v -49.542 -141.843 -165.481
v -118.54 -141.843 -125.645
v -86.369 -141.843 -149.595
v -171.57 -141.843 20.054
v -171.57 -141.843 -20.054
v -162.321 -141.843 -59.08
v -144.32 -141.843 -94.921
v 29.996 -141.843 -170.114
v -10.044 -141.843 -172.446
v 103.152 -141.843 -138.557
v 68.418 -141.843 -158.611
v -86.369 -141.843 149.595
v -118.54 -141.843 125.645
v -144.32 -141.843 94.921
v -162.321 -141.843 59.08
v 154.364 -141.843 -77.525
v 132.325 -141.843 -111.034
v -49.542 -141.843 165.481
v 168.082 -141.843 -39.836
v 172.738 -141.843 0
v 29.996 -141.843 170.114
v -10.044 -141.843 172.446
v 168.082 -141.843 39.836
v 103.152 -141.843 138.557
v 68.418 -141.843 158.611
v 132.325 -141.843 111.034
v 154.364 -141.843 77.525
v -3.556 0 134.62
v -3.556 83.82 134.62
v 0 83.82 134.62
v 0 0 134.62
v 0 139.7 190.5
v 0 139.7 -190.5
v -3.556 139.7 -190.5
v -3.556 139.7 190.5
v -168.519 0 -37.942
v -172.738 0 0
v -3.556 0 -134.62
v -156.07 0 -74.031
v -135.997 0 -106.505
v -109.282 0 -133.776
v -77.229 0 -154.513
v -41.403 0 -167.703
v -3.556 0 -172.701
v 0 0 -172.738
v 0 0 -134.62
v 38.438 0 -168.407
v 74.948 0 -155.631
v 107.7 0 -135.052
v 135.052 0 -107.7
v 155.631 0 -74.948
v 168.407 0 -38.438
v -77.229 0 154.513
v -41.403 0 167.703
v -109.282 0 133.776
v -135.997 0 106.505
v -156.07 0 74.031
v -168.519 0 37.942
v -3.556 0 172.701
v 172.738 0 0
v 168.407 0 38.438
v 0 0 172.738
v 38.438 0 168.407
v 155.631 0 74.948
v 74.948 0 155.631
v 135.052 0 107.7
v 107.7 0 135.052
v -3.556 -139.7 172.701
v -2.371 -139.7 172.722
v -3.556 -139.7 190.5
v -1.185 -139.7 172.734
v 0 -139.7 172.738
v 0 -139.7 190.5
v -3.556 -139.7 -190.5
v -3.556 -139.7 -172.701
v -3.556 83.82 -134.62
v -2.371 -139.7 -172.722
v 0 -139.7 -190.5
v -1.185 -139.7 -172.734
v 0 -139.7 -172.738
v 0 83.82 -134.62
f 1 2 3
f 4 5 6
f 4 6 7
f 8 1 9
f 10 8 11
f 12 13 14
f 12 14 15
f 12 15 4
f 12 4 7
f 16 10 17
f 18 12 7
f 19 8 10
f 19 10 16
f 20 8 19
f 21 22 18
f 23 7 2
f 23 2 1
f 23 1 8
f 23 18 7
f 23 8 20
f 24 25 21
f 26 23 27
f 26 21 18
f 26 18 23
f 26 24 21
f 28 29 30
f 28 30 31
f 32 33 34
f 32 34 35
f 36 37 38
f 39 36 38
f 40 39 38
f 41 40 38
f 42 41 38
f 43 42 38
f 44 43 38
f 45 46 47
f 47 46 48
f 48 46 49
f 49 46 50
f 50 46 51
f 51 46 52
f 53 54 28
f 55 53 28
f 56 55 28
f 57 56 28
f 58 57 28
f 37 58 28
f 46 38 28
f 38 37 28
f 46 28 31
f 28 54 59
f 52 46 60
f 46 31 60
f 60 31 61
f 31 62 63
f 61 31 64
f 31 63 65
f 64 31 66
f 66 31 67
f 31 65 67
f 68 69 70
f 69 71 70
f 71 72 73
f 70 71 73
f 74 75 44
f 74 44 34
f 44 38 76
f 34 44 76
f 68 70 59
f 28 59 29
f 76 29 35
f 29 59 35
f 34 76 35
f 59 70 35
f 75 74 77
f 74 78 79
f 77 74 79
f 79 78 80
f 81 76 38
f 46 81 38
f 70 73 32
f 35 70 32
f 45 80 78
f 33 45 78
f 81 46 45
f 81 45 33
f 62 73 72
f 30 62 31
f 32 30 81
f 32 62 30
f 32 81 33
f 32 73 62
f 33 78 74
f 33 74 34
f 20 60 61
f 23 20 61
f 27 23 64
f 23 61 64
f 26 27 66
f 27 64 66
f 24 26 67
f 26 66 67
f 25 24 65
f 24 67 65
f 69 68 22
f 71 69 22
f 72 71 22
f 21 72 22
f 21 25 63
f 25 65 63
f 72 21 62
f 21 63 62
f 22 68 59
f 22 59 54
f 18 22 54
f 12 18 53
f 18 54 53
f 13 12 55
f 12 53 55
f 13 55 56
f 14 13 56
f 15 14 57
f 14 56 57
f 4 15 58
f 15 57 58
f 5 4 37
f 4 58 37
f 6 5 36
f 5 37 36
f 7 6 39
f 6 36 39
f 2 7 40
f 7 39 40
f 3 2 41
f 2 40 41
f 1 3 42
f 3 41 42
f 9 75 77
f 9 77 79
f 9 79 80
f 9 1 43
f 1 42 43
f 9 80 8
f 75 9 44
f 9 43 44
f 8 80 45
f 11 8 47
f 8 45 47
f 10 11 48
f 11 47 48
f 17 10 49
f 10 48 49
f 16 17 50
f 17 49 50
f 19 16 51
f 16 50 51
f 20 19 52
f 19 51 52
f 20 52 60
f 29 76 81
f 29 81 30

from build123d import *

# Parameters (mm, degrees)
F0_W     = 279.4
F0_H     = 381
F1_DEPTH = 3.556
F2_W     = 167.639992
F2_H     = 269.239992
F3_DEPTH = 56.388
F4_R     = 172.737905
F5_DEPTH = 141.843393


with BuildPart() as f1:
    # F0 (on Right) → F1 (new body)
    with BuildSketch(Plane.YZ):
        Rectangle(F0_W, F0_H)
    extrude(amount=-F1_DEPTH)

    # F2 (on face) → F3 (cut)
    with BuildSketch(Plane(origin=(-3.556, 0, 0), x_dir=(0, -1, 0), z_dir=(-1, 0, 0))):
        Rectangle(F2_W, F2_H)
    extrude(amount=-F3_DEPTH, mode=Mode.SUBTRACT)

    # F4 (on Front) → F5 (join)
    with BuildSketch(Plane.XZ):
        Circle(F4_R)
    extrude(amount=F5_DEPTH)


solid = f1.part
